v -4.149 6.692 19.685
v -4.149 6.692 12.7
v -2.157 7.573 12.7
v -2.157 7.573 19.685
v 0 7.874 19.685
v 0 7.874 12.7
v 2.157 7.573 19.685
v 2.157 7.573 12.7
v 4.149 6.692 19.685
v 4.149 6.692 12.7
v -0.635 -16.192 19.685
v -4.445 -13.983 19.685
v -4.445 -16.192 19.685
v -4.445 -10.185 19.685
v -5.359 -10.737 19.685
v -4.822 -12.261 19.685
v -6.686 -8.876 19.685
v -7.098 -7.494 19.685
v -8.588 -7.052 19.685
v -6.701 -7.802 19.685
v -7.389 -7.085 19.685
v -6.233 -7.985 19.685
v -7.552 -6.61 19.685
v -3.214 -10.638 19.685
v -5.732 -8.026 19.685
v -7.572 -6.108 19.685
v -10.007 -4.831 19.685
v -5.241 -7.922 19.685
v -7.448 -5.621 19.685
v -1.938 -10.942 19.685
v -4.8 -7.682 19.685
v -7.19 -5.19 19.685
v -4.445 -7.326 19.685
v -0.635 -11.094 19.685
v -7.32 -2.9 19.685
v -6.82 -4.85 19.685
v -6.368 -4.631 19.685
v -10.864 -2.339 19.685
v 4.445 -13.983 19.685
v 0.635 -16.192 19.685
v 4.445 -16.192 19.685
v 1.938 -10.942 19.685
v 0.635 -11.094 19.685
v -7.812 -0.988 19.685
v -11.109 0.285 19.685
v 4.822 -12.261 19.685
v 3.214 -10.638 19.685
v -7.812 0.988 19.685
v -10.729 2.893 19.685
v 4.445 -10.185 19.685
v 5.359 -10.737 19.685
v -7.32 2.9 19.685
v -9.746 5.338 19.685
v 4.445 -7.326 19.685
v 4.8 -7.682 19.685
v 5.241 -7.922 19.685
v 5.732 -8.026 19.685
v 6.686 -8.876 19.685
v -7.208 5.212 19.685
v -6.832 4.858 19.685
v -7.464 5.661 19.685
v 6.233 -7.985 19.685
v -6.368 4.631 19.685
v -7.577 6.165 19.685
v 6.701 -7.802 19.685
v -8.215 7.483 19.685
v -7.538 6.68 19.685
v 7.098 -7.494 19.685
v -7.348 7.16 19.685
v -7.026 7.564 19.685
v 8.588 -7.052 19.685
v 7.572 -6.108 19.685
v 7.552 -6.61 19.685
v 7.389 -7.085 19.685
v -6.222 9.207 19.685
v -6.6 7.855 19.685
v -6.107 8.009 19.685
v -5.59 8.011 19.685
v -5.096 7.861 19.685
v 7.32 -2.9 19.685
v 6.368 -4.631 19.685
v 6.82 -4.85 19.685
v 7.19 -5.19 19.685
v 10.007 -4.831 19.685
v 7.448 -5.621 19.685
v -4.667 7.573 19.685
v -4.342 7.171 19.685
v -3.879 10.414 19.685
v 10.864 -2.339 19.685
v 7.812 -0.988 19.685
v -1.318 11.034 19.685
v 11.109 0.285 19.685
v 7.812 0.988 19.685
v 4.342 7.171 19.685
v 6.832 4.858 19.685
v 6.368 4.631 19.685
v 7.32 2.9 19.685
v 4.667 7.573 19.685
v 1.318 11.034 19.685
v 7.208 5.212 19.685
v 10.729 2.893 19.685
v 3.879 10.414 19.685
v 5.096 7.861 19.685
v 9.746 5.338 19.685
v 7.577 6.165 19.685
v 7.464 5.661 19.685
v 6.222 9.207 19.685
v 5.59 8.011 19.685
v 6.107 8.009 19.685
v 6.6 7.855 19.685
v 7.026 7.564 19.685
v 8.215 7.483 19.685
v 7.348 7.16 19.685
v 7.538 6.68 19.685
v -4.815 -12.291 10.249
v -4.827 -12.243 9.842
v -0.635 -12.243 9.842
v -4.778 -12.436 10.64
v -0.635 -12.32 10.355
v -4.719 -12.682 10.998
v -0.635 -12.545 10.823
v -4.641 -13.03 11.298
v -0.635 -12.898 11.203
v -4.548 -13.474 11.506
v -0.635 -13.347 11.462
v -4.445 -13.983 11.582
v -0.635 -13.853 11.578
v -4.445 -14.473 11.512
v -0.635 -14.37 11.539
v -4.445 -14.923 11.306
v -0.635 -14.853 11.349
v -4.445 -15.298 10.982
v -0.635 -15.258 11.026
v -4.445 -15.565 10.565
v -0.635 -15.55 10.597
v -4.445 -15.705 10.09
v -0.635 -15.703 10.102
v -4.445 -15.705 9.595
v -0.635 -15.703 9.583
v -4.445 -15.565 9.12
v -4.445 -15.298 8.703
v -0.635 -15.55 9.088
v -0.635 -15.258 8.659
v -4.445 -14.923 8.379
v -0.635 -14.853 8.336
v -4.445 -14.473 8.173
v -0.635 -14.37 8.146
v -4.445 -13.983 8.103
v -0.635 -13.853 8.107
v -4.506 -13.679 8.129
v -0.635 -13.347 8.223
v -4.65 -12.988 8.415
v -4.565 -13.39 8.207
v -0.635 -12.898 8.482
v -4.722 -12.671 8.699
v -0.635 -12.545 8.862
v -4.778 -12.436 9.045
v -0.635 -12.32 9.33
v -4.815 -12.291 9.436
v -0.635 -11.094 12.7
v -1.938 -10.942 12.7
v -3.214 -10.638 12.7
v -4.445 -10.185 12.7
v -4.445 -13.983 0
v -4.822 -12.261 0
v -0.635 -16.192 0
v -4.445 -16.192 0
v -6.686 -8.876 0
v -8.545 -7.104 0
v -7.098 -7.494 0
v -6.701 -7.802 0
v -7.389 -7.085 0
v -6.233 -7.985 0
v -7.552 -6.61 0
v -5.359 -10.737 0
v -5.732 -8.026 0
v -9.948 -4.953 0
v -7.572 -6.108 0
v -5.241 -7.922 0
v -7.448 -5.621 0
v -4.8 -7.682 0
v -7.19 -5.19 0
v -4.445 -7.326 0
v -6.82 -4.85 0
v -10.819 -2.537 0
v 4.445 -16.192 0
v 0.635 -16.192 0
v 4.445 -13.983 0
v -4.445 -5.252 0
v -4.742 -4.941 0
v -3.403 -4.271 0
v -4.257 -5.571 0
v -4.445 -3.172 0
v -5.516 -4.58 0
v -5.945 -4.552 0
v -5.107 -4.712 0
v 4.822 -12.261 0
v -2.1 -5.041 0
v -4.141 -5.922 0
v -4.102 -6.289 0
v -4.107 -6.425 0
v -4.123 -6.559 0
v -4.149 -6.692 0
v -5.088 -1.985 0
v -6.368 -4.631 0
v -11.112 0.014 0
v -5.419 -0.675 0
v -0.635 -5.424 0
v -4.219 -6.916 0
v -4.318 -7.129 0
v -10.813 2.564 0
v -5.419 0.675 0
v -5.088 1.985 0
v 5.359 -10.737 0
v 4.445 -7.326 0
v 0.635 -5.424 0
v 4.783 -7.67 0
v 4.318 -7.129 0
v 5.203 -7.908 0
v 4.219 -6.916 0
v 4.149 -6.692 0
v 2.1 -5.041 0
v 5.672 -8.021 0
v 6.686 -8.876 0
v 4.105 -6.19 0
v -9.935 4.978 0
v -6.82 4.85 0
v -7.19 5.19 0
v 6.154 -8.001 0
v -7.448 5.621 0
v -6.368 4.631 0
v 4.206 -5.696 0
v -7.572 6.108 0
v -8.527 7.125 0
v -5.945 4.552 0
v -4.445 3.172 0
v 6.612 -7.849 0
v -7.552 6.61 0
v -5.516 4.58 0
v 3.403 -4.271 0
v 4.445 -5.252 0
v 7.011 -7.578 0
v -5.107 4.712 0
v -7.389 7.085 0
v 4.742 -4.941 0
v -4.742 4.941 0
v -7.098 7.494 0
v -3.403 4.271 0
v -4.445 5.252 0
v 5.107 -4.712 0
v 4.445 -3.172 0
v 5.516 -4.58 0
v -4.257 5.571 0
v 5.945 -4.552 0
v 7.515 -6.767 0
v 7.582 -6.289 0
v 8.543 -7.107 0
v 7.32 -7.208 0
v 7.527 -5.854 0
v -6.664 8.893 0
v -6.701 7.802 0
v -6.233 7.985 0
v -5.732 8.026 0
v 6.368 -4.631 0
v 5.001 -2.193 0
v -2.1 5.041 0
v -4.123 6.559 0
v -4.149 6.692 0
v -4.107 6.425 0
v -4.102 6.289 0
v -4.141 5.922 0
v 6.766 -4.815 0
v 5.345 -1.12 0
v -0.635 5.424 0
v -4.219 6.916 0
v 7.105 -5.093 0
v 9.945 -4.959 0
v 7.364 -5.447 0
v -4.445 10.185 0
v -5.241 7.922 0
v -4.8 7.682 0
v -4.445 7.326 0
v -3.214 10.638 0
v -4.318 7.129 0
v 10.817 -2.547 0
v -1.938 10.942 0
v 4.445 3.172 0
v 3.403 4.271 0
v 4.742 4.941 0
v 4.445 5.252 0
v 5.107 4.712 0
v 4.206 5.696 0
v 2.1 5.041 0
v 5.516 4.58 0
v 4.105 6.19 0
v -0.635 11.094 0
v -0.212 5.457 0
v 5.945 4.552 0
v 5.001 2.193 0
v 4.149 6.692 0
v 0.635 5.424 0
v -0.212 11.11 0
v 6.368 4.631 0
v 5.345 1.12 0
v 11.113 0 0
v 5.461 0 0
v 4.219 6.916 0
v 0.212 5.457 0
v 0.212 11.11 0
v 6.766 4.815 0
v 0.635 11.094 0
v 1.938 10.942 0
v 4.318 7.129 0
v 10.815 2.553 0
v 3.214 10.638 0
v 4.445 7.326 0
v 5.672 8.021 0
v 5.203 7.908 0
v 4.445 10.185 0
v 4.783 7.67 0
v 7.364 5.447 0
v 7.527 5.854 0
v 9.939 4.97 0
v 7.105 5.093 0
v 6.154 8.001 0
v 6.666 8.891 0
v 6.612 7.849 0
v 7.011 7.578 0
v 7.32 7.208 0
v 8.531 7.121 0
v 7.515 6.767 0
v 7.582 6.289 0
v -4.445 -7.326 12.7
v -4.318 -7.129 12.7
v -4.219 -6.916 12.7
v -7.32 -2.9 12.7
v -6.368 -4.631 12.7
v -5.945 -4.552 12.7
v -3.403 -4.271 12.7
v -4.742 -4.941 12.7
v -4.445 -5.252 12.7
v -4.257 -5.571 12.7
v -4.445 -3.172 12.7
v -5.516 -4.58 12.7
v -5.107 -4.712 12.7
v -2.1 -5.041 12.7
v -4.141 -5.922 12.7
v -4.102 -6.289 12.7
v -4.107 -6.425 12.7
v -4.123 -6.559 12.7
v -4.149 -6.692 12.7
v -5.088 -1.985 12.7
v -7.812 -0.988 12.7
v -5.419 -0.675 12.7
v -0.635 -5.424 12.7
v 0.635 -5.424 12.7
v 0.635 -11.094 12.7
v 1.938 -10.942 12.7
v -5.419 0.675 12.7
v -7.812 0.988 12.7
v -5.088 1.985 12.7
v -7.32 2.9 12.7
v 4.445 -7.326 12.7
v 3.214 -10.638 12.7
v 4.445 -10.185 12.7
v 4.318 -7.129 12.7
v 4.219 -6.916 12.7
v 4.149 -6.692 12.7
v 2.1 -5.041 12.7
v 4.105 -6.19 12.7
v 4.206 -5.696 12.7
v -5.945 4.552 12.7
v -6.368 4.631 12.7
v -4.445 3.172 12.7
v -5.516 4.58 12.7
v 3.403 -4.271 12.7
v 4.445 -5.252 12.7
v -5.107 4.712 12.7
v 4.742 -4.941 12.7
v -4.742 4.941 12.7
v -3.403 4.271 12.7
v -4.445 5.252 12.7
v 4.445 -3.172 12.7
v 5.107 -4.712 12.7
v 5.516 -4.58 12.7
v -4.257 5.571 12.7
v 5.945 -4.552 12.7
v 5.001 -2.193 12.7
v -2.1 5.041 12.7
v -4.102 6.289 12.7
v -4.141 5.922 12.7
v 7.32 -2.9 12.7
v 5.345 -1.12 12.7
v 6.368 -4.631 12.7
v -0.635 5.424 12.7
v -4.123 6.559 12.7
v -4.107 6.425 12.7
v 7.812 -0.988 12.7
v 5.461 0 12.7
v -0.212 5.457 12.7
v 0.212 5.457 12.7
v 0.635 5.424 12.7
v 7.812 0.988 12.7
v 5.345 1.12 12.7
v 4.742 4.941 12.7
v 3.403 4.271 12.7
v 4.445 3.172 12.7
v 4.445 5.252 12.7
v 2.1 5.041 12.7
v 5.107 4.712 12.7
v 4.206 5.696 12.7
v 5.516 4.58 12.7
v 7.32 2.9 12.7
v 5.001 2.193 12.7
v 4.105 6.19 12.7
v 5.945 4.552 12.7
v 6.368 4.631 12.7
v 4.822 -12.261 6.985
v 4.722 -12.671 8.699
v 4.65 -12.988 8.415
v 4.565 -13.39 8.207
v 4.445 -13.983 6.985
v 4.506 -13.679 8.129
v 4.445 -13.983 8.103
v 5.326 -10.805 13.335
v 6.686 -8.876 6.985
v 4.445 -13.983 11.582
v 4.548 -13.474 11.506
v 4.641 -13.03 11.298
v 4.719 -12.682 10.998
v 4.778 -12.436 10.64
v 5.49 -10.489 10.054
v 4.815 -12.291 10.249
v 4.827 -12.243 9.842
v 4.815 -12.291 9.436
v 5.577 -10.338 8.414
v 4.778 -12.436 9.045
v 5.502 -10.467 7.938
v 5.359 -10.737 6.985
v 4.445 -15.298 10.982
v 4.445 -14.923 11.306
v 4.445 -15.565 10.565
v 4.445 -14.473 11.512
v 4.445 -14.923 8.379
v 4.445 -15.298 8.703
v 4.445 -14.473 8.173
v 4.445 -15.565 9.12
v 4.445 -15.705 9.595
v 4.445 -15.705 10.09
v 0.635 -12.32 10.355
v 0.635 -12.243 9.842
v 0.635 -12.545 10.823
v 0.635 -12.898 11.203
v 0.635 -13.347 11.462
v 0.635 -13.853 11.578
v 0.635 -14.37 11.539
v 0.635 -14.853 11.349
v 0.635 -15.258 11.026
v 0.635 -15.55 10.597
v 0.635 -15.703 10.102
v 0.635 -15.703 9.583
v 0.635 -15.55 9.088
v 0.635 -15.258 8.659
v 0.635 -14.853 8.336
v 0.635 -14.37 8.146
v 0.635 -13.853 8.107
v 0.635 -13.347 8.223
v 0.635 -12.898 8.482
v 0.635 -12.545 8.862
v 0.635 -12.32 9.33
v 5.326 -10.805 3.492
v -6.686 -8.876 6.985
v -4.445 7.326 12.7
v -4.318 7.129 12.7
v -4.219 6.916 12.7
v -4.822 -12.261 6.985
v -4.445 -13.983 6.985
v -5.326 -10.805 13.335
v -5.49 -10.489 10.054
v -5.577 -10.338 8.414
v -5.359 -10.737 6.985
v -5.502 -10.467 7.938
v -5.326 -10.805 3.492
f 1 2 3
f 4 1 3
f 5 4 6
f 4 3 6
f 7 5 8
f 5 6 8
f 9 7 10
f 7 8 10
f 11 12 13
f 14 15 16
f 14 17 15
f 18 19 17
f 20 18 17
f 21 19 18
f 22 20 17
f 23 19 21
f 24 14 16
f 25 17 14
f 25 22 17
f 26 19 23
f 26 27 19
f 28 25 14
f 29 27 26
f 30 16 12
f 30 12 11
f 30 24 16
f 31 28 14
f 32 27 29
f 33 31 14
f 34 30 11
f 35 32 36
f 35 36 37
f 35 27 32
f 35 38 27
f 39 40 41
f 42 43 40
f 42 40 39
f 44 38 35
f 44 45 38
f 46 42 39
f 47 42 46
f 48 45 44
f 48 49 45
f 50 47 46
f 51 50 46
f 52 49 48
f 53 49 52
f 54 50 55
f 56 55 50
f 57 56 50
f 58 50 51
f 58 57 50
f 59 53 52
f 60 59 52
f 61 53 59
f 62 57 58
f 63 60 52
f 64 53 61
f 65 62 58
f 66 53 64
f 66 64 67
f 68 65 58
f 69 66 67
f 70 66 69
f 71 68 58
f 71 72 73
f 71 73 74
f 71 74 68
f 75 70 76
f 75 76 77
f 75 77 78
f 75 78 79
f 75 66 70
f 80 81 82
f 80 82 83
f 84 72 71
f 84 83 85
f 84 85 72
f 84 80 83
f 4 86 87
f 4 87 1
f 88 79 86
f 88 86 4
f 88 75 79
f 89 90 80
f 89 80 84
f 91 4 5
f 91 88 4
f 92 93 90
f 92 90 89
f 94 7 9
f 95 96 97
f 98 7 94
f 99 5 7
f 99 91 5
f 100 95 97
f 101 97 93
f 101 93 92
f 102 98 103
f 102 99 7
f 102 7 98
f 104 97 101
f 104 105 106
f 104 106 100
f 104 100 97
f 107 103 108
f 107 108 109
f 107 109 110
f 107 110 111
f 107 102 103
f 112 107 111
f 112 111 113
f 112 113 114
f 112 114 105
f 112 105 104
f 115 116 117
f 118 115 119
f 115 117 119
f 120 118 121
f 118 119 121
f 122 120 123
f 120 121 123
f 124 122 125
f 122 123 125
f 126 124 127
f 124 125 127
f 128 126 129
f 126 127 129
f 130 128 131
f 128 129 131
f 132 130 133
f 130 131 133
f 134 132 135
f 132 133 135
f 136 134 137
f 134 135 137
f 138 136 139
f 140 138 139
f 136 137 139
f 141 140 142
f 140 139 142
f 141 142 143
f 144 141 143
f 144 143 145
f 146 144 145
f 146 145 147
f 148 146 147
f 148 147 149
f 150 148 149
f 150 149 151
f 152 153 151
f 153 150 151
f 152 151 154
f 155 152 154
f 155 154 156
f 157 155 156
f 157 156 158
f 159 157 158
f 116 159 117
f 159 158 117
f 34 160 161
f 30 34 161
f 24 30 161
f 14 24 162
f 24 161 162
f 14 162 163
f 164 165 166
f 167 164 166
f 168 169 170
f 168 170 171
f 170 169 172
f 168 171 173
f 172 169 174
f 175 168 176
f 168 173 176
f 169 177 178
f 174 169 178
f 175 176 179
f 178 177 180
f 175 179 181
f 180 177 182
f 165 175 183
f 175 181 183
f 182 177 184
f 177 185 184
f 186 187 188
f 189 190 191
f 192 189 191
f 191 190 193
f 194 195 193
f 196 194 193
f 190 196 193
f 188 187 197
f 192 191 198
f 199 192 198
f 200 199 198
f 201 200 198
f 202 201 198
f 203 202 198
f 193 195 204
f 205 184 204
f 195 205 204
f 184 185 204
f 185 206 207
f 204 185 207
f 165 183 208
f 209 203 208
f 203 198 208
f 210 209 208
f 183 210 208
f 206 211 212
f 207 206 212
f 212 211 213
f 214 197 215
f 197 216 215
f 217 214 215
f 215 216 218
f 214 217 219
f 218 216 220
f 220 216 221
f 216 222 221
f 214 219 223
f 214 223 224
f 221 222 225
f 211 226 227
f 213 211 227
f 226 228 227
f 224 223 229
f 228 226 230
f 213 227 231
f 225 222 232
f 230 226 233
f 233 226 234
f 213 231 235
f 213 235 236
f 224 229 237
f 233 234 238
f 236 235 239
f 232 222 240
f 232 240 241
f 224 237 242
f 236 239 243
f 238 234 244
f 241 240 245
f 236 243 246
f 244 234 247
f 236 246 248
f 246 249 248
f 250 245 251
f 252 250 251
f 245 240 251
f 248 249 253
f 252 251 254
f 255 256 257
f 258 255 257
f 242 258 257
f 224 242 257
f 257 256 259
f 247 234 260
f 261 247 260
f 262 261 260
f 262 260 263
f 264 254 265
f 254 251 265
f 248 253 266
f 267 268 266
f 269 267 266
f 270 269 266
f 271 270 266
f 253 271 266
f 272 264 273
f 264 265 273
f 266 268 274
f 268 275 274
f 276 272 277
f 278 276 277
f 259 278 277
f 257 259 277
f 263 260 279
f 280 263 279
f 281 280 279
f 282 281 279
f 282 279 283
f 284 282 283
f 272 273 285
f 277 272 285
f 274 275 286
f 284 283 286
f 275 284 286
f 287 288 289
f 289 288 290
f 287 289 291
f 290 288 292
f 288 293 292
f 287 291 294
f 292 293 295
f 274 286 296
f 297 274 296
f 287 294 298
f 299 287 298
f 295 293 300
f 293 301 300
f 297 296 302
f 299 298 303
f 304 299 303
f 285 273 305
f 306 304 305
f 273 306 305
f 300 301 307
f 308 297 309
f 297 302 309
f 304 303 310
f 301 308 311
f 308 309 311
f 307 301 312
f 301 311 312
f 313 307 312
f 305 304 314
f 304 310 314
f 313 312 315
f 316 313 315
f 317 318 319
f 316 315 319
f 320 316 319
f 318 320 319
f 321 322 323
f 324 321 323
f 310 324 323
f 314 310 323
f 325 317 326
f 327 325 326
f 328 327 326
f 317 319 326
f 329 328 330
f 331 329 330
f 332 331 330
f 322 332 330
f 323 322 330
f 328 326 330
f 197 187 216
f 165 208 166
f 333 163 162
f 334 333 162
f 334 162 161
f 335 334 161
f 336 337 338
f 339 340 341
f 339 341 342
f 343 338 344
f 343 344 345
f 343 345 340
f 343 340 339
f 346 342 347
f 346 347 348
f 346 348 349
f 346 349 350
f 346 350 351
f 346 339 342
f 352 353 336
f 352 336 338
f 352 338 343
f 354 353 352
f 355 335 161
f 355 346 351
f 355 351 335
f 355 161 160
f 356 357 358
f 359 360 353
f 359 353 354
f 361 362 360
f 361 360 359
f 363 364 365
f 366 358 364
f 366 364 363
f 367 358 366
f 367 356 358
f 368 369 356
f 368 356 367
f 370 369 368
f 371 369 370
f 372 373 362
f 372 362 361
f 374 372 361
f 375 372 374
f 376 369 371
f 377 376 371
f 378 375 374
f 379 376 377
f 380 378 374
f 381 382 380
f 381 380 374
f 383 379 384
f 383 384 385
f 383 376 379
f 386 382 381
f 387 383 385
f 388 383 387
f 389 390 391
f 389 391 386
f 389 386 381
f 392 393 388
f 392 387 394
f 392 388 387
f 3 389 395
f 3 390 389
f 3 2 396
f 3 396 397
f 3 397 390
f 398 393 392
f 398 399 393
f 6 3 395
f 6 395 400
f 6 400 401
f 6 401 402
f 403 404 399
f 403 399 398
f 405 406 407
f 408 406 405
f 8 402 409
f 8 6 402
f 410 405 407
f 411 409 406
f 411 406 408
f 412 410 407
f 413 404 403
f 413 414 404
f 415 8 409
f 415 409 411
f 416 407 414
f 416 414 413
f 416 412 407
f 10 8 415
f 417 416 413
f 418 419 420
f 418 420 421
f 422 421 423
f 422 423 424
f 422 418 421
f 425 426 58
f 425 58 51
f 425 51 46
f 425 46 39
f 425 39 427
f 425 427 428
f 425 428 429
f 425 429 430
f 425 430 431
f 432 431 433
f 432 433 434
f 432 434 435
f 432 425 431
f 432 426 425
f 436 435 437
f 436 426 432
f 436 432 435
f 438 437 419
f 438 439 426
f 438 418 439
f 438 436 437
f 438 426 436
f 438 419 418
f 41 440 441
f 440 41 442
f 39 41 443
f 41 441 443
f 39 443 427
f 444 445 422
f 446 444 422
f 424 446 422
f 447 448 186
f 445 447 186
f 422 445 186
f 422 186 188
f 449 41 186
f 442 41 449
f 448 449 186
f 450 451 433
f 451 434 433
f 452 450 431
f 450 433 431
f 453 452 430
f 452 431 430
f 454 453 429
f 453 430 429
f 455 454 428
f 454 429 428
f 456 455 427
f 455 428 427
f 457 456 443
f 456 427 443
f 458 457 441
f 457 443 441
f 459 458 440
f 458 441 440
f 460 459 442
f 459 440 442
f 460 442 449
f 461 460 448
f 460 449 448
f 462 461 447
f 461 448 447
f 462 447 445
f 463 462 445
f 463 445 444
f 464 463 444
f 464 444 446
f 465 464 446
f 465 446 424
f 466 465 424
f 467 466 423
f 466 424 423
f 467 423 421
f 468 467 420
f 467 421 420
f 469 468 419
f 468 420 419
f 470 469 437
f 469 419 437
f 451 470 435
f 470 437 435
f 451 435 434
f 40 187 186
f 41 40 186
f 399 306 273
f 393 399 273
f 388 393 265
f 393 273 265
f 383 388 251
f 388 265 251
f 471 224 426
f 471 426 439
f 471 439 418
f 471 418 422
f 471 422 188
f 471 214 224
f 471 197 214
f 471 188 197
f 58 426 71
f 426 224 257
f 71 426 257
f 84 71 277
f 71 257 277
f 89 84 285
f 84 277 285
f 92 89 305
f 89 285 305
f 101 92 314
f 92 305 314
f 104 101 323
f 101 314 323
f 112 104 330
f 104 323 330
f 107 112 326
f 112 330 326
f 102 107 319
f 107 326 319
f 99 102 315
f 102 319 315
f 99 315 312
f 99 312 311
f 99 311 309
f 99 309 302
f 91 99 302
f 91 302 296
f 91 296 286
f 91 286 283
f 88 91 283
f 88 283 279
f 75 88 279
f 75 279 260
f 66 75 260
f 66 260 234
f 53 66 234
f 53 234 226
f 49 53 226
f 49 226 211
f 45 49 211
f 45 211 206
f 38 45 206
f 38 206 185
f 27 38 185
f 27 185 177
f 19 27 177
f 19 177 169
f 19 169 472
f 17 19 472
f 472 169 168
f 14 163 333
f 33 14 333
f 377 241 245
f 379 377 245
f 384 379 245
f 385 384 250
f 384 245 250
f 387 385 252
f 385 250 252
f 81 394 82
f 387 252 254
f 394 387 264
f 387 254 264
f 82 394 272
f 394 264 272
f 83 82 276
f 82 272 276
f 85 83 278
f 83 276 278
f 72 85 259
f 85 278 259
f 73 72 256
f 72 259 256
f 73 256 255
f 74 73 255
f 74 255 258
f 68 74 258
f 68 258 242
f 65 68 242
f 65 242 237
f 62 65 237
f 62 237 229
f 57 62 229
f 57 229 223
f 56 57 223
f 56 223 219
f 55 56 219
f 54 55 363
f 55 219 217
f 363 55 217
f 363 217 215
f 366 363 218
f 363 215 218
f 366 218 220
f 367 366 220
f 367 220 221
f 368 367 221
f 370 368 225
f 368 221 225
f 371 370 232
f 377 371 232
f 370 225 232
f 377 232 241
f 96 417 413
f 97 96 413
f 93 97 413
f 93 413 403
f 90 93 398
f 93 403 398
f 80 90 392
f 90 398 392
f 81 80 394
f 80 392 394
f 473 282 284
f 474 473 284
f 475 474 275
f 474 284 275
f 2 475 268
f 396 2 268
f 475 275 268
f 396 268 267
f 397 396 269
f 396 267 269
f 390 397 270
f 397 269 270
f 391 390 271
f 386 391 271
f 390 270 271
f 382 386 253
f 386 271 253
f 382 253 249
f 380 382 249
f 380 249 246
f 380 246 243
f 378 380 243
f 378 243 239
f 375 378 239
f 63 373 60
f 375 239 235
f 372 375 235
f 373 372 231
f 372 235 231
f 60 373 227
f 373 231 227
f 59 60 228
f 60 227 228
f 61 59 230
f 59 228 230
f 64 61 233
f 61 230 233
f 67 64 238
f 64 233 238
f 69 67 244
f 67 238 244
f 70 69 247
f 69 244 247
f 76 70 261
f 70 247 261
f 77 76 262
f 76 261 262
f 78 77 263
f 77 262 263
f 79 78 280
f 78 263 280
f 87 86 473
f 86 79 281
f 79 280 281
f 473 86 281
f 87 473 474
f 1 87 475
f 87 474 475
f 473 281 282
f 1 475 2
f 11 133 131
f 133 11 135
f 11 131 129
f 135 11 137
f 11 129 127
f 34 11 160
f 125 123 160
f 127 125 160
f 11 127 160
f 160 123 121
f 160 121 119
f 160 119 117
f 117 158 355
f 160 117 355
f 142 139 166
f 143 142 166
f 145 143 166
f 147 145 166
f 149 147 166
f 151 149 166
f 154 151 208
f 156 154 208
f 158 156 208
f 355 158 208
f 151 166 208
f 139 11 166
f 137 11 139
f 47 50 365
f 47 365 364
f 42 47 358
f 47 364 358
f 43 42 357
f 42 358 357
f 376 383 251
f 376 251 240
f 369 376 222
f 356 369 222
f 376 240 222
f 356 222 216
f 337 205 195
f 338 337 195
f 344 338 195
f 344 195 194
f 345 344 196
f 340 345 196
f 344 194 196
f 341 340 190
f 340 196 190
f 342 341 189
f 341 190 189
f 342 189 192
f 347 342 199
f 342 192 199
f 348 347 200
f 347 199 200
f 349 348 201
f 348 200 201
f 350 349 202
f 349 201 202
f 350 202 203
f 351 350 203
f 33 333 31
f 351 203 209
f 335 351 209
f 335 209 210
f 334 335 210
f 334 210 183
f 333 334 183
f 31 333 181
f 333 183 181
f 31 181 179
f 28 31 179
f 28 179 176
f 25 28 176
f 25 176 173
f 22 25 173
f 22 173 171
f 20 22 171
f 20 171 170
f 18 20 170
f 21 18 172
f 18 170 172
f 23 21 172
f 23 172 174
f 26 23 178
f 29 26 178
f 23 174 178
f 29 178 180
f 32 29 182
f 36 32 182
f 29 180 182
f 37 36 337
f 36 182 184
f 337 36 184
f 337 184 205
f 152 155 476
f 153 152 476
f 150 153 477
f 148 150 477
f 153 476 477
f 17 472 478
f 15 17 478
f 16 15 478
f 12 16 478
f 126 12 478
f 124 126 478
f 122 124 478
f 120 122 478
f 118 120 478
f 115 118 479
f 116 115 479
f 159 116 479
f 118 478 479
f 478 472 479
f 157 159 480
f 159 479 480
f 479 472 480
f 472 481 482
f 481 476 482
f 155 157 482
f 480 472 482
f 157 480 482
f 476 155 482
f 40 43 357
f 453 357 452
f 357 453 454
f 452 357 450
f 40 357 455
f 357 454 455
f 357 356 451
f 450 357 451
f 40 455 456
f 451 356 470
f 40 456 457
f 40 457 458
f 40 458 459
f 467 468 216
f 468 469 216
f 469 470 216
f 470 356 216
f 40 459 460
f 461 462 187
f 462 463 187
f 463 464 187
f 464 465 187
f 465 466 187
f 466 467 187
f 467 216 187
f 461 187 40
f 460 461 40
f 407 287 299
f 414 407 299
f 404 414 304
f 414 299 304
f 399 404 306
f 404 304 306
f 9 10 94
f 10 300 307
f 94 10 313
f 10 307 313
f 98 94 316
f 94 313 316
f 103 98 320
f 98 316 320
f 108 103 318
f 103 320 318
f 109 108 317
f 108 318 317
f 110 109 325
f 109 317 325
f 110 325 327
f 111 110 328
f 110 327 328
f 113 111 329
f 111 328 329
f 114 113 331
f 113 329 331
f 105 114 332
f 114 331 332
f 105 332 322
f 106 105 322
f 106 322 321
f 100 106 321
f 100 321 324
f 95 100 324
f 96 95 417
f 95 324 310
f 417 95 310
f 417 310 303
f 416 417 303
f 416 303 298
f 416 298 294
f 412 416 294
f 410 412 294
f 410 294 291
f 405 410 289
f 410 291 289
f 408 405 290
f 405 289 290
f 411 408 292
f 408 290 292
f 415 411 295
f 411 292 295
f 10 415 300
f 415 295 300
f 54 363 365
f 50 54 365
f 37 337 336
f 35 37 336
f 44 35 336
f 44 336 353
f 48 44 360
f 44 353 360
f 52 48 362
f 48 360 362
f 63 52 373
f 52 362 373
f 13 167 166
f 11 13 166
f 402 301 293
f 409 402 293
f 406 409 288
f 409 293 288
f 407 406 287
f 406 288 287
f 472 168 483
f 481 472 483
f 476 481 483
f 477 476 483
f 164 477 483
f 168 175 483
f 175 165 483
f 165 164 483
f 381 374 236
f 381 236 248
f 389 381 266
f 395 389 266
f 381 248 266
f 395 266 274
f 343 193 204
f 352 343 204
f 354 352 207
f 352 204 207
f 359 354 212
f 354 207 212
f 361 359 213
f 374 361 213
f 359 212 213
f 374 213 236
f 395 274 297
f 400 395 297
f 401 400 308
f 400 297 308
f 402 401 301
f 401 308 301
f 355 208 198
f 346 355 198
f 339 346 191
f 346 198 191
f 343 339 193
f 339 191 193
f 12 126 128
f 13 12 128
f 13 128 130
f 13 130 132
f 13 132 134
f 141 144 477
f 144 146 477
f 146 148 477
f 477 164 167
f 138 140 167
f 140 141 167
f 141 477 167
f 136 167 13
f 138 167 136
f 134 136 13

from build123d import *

# Parameters (mm, degrees)
F1_DEPTH      = 6.985
F2_DEPTH      = 12.7
F3_R          = 1.7399
F4_DEPTH      = 25.4
F4_DEPTH_BACK = 25.4


with BuildPart() as f1:
    # F0 (on Top) → F1 (new body)
    with BuildSketch(Plane.XY):
        with BuildLine():
            ThreePointArc((-6.6861946277, -8.8759482677), (-5.6039387911, -9.5960161669), (-4.445, -10.184774482))
            Line((-4.445, -10.184774482), (-4.445, -7.326322721))
            ThreePointArc((-4.445, -7.326322721), (-7.2583236845, -7.2997742217), (-6.3683207306, -4.6308063091))
            ThreePointArc((-6.3683207306, -4.6308063091), (-7.874, 0), (-6.3683207306, 4.6308063091))
            ThreePointArc((-6.3683207306, 4.6308063091), (-7.2583236845, 7.2997742217), (-4.445, 7.326322721))
            Line((-4.445, 7.326322721), (-4.445, 10.184774482))
            ThreePointArc((-4.445, 10.184774482), (-11.0364696074, 1.2976882733), (-6.6861946277, -8.8759482677))
        make_face()
        with BuildLine():
            Line((-0.635, 7.8483533942), (-0.635, 11.0943423081))
            ThreePointArc((-0.635, 11.0943423081), (-2.5803930723, 10.808756998), (-4.445, 10.184774482))
            Line((-4.445, 10.184774482), (-4.445, 7.326322721))
            ThreePointArc((-4.445, 7.326322721), (-4.264959614, 7.0241706334), (-4.149365906, 6.6919831573))
            ThreePointArc((-4.149365906, 6.6919831573), (-2.4610642641, 7.4795079175), (-0.635, 7.8483533942))
        make_face()
        with BuildLine():
            Line((4.445, 7.326322721), (4.445, 10.184774482))
            ThreePointArc((4.445, 10.184774482), (2.5803930723, 10.808756998), (0.635, 11.0943423081))
            Line((0.635, 11.0943423081), (0.635, 7.8483533942))
            ThreePointArc((0.635, 7.8483533942), (2.4610642641, 7.4795079175), (4.149365906, 6.6919831573))
            ThreePointArc((4.149365906, 6.6919831573), (4.264959614, 7.0241706334), (4.445, 7.326322721))
        make_face()
        with BuildLine():
            ThreePointArc((4.445, -10.184774482), (5.6039387911, -9.5960161669), (6.6861946277, -8.8759482677))
            ThreePointArc((6.6861946277, -8.8759482677), (9.9445460945, -4.959199454), (11.1125, 0))
            ThreePointArc((11.1125, 0), (9.2973845449, 6.0865669203), (4.445, 10.184774482))
            Line((4.445, 10.184774482), (4.445, 7.326322721))
            ThreePointArc((4.445, 7.326322721), (6.3881738322, 7.9411428381), (7.5819, 6.2891906127))
            ThreePointArc((7.5819, 6.2891906127), (7.2461006818, 5.2616920554), (6.3683207306, 4.6308063091))
            ThreePointArc((6.3683207306, 4.6308063091), (7.4881250468, 2.4347195493), (7.874, 0))
            ThreePointArc((7.874, 0), (7.4881250468, -2.4347195493), (6.3683207306, -4.6308063091))
            ThreePointArc((6.3683207306, -4.6308063091), (7.2461006818, -5.2616920554), (7.5819, -6.2891906127))
            ThreePointArc((7.5819, -6.2891906127), (6.3881738322, -7.9411428381), (4.445, -7.326322721))
            Line((4.445, -7.326322721), (4.445, -10.184774482))
        make_face()
        with BuildLine():
            Line((0.635, 7.8483533942), (0.635, 11.0943423081))
            ThreePointArc((0.635, 11.0943423081), (0, 11.1125), (-0.635, 11.0943423081))
            Line((-0.635, 11.0943423081), (-0.635, 7.8483533942))
            ThreePointArc((-0.635, 7.8483533942), (0, 7.874), (0.635, 7.8483533942))
        make_face()
        with BuildLine():
            Line((-4.445, -13.9827691019), (-4.445, -10.184774482))
            ThreePointArc((-4.445, -10.184774482), (-5.6039387911, -9.5960161669), (-6.6861946277, -8.8759482677))
            add(Edge.make_bspline(
                [(-6.6861946277, -8.8759482677), (-6.1885628089, -9.4638964345), (-5.0921901135, -10.7354953403), (-4.6739221939, -12.8428610165), (-4.445, -13.9827691019)],
                knots=[0, 0, 0, 0, 0.4582938074, 1, 1, 1, 1], degree=3))
        make_face()
        with BuildLine():
            Line((-0.635, -16.1925), (-0.635, -11.0943423081))
            ThreePointArc((-0.635, -11.0943423081), (-2.5803930723, -10.808756998), (-4.445, -10.184774482))
            Line((-4.445, -10.184774482), (-4.445, -13.9827691019))
            Line((-4.445, -13.9827691019), (-4.445, -16.1925))
            Line((-4.445, -16.1925), (-0.635, -16.1925))
        make_face()
        with BuildLine():
            Line((4.445, -13.9827691019), (4.445, -10.184774482))
            ThreePointArc((4.445, -10.184774482), (2.5803930723, -10.808756998), (0.635, -11.0943423081))
            Line((0.635, -11.0943423081), (0.635, -16.1925))
            Line((0.635, -16.1925), (4.445, -16.1925))
            Line((4.445, -16.1925), (4.445, -13.9827691019))
        make_face()
        with BuildLine():
            add(Edge.make_bspline(
                [(6.6861946277, -8.8759482677), (6.1885628089, -9.4638964345), (5.0921901135, -10.7354953403), (4.6739221939, -12.8428610165), (4.445, -13.9827691019)],
                knots=[0, 0, 0, 0, 0.4582938074, 1, 1, 1, 1], degree=3))
            ThreePointArc((6.6861946277, -8.8759482677), (5.6039387911, -9.5960161669), (4.445, -10.184774482))
            Line((4.445, -10.184774482), (4.445, -13.9827691019))
        make_face()
    extrude(amount=F1_DEPTH)

    # F0 (on Top) + F1_face (on face) → F2 (join)
    with BuildSketch(Plane.XY):
        with BuildLine():
            ThreePointArc((-6.3683207306, 4.6308063091), (-7.874, 0), (-6.3683207306, -4.6308063091))
            ThreePointArc((-6.3683207306, -4.6308063091), (-5.3072017482, -4.6335207061), (-4.445, -5.2520585045))
            Line((-4.445, -5.2520585045), (-4.445, -3.1724589832))
            ThreePointArc((-4.445, -3.1724589832), (-5.461, 0), (-4.445, 3.1724589832))
            Line((-4.445, 3.1724589832), (-4.445, 5.2520585045))
            ThreePointArc((-4.445, 5.2520585045), (-5.3072017482, 4.6335207061), (-6.3683207306, 4.6308063091))
        make_face()
        with BuildLine():
            Line((-0.635, 5.423955752), (-0.635, 7.8483533942))
            ThreePointArc((-0.635, 7.8483533942), (-2.4610642641, 7.4795079175), (-4.149365906, 6.6919831573))
            ThreePointArc((-4.149365906, 6.6919831573), (-4.113956877, 6.491968755), (-4.1021, 6.2891906127))
            ThreePointArc((-4.1021, 6.2891906127), (-4.1900477746, 5.7430167805), (-4.445, 5.2520585045))
            Line((-4.445, 5.2520585045), (-4.445, 3.1724589832))
            ThreePointArc((-4.445, 3.1724589832), (-2.7782925377, 4.7014478169), (-0.635, 5.423955752))
        make_face()
        with BuildLine():
            ThreePointArc((4.149365906, 6.6919831573), (2.4610642641, 7.4795079175), (0.635, 7.8483533942))
            Line((0.635, 7.8483533942), (0.635, 5.423955752))
            ThreePointArc((0.635, 5.423955752), (2.7782925377, 4.7014478169), (4.445, 3.1724589832))
            Line((4.445, 3.1724589832), (4.445, 5.2520585045))
            ThreePointArc((4.445, 5.2520585045), (4.1376510158, 5.9392669784), (4.149365906, 6.6919831573))
        make_face()
        with BuildLine():
            Line((4.445, -3.1724589832), (4.445, -5.2520585045))
            ThreePointArc((4.445, -5.2520585045), (5.3072017482, -4.6335207061), (6.3683207306, -4.6308063091))
            ThreePointArc((6.3683207306, -4.6308063091), (7.4881250468, -2.4347195493), (7.874, 0))
            ThreePointArc((7.874, 0), (7.4881250468, 2.4347195493), (6.3683207306, 4.6308063091))
            ThreePointArc((6.3683207306, 4.6308063091), (5.3072017482, 4.6335207061), (4.445, 5.2520585045))
            Line((4.445, 5.2520585045), (4.445, 3.1724589832))
            ThreePointArc((4.445, 3.1724589832), (5.2008011883, 1.6655893852), (5.461, 0))
            ThreePointArc((5.461, 0), (5.2008011883, -1.6655893852), (4.445, -3.1724589832))
        make_face()
        with BuildLine():
            Line((0.635, -5.423955752), (0.635, -7.8483533942))
            ThreePointArc((0.635, -7.8483533942), (2.4610642641, -7.4795079175), (4.149365906, -6.6919831573))
            ThreePointArc((4.149365906, -6.6919831573), (4.1376510158, -5.9392669784), (4.445, -5.2520585045))
            Line((4.445, -5.2520585045), (4.445, -3.1724589832))
            ThreePointArc((4.445, -3.1724589832), (2.7782925377, -4.7014478169), (0.635, -5.423955752))
        make_face()
        with BuildLine():
            ThreePointArc((-4.149365906, -6.6919831573), (-2.4610642641, -7.4795079175), (-0.635, -7.8483533942))
            Line((-0.635, -7.8483533942), (-0.635, -5.423955752))
            ThreePointArc((-0.635, -5.423955752), (-2.7782925377, -4.7014478169), (-4.445, -3.1724589832))
            Line((-4.445, -3.1724589832), (-4.445, -5.2520585045))
            ThreePointArc((-4.445, -5.2520585045), (-4.1900477746, -5.7430167805), (-4.1021, -6.2891906127))
            ThreePointArc((-4.1021, -6.2891906127), (-4.113956877, -6.491968755), (-4.149365906, -6.6919831573))
        make_face()
        with BuildLine():
            ThreePointArc((-4.445, -10.184774482), (-2.5803930723, -10.808756998), (-0.635, -11.0943423081))
            Line((-0.635, -11.0943423081), (-0.635, -7.8483533942))
            ThreePointArc((-0.635, -7.8483533942), (-2.4610642641, -7.4795079175), (-4.149365906, -6.6919831573))
            ThreePointArc((-4.149365906, -6.6919831573), (-4.264959614, -7.0241706334), (-4.445, -7.326322721))
            Line((-4.445, -7.326322721), (-4.445, -10.184774482))
        make_face()
        with BuildLine():
            ThreePointArc((0.635, -11.0943423081), (2.5803930723, -10.808756998), (4.445, -10.184774482))
            Line((4.445, -10.184774482), (4.445, -7.326322721))
            ThreePointArc((4.445, -7.326322721), (4.264959614, -7.0241706334), (4.149365906, -6.6919831573))
            ThreePointArc((4.149365906, -6.6919831573), (2.4610642641, -7.4795079175), (0.635, -7.8483533942))
            Line((0.635, -7.8483533942), (0.635, -11.0943423081))
        make_face()
        with BuildLine():
            ThreePointArc((4.445, -10.184774482), (5.6039387911, -9.5960161669), (6.6861946277, -8.8759482677))
            ThreePointArc((6.6861946277, -8.8759482677), (9.9445460945, -4.959199454), (11.1125, 0))
            ThreePointArc((11.1125, 0), (9.2973845449, 6.0865669203), (4.445, 10.184774482))
            Line((4.445, 10.184774482), (4.445, 7.326322721))
            ThreePointArc((4.445, 7.326322721), (6.3881738322, 7.9411428381), (7.5819, 6.2891906127))
            ThreePointArc((7.5819, 6.2891906127), (7.2461006818, 5.2616920554), (6.3683207306, 4.6308063091))
            ThreePointArc((6.3683207306, 4.6308063091), (7.4881250468, 2.4347195493), (7.874, 0))
            ThreePointArc((7.874, 0), (7.4881250468, -2.4347195493), (6.3683207306, -4.6308063091))
            ThreePointArc((6.3683207306, -4.6308063091), (7.2461006818, -5.2616920554), (7.5819, -6.2891906127))
            ThreePointArc((7.5819, -6.2891906127), (6.3881738322, -7.9411428381), (4.445, -7.326322721))
            Line((4.445, -7.326322721), (4.445, -10.184774482))
        make_face()
        with BuildLine():
            Line((4.445, 7.326322721), (4.445, 10.184774482))
            ThreePointArc((4.445, 10.184774482), (2.5803930723, 10.808756998), (0.635, 11.0943423081))
            Line((0.635, 11.0943423081), (0.635, 7.8483533942))
            ThreePointArc((0.635, 7.8483533942), (2.4610642641, 7.4795079175), (4.149365906, 6.6919831573))
            ThreePointArc((4.149365906, 6.6919831573), (4.264959614, 7.0241706334), (4.445, 7.326322721))
        make_face()
        with BuildLine():
            Line((-0.635, 7.8483533942), (-0.635, 11.0943423081))
            ThreePointArc((-0.635, 11.0943423081), (-2.5803930723, 10.808756998), (-4.445, 10.184774482))
            Line((-4.445, 10.184774482), (-4.445, 7.326322721))
            ThreePointArc((-4.445, 7.326322721), (-4.264959614, 7.0241706334), (-4.149365906, 6.6919831573))
            ThreePointArc((-4.149365906, 6.6919831573), (-2.4610642641, 7.4795079175), (-0.635, 7.8483533942))
        make_face()
        with BuildLine():
            ThreePointArc((-6.6861946277, -8.8759482677), (-5.6039387911, -9.5960161669), (-4.445, -10.184774482))
            Line((-4.445, -10.184774482), (-4.445, -7.326322721))
            ThreePointArc((-4.445, -7.326322721), (-7.2583236845, -7.2997742217), (-6.3683207306, -4.6308063091))
            ThreePointArc((-6.3683207306, -4.6308063091), (-7.874, 0), (-6.3683207306, 4.6308063091))
            ThreePointArc((-6.3683207306, 4.6308063091), (-7.2583236845, 7.2997742217), (-4.445, 7.326322721))
            Line((-4.445, 7.326322721), (-4.445, 10.184774482))
            ThreePointArc((-4.445, 10.184774482), (-11.0364696074, 1.2976882733), (-6.6861946277, -8.8759482677))
        make_face()
        with BuildLine():
            Line((0.635, 7.8483533942), (0.635, 11.0943423081))
            ThreePointArc((0.635, 11.0943423081), (0, 11.1125), (-0.635, 11.0943423081))
            Line((-0.635, 11.0943423081), (-0.635, 7.8483533942))
            ThreePointArc((-0.635, 7.8483533942), (0, 7.874), (0.635, 7.8483533942))
        make_face()
        with BuildLine():
            Line((0.635, 5.423955752), (0.635, 7.8483533942))
            ThreePointArc((0.635, 7.8483533942), (0, 7.874), (-0.635, 7.8483533942))
            Line((-0.635, 7.8483533942), (-0.635, 5.423955752))
            ThreePointArc((-0.635, 5.423955752), (0, 5.461), (0.635, 5.423955752))
        make_face()
    with BuildSketch(Plane(origin=(0, -1.8857820948, 6.985), x_dir=(1, 0, 0), z_dir=(0, 0, 1))):
        with BuildLine():
            ThreePointArc((-4.445, -5.4405406262), (-7.2583236845, -5.4139921269), (-6.3683207306, -2.7450242143))
            ThreePointArc((-6.3683207306, -2.7450242143), (-7.874, 1.8857820948), (-6.3683207306, 6.5165884039))
            ThreePointArc((-6.3683207306, 6.5165884039), (-7.0261385963, 9.4497541769), (-4.149365906, 8.5777652521))
            ThreePointArc((-4.149365906, 8.5777652521), (0, 9.7597820948), (4.149365906, 8.5777652521))
            ThreePointArc((4.149365906, 8.5777652521), (7.0261385963, 9.4497541769), (6.3683207306, 6.5165884039))
            ThreePointArc((6.3683207306, 6.5165884039), (7.874, 1.8857820948), (6.3683207306, -2.7450242143))
            ThreePointArc((6.3683207306, -2.7450242143), (7.2583236845, -5.4139921269), (4.445, -5.4405406262))
            Line((4.445, -5.4405406262), (4.445, -8.2989923872))
            ThreePointArc((4.445, -8.2989923872), (2.5803930723, -8.9229749032), (0.635, -9.2085602133))
            Line((0.635, -9.2085602133), (0.635, -14.3067179052))
            Line((0.635, -14.3067179052), (4.445, -14.3067179052))
            Line((4.445, -14.3067179052), (4.445, -12.0969870071))
            add(Edge.make_bspline(
                [(6.6861946277, -6.9901661729), (6.1885628089, -7.5781143397), (5.0921901135, -8.8497132455), (4.6739221939, -10.9570789217), (4.445, -12.0969870071)],
                knots=[0, 0, 0, 0, 0.4582938074, 1, 1, 1, 1], degree=3))
            ThreePointArc((6.6861946277, -6.9901661729), (0, 12.9982820948), (-6.6861946277, -6.9901661729))
            add(Edge.make_bspline(
                [(-6.6861946277, -6.9901661729), (-6.1885628089, -7.5781143397), (-5.0921901135, -8.8497132455), (-4.6739221939, -10.9570789217), (-4.445, -12.0969870071)],
                knots=[0, 0, 0, 0, 0.4582938074, 1, 1, 1, 1], degree=3))
            Line((-4.445, -12.0969870071), (-4.445, -14.3067179052))
            Line((-4.445, -14.3067179052), (-0.635, -14.3067179052))
            Line((-0.635, -14.3067179052), (-0.635, -9.2085602133))
            ThreePointArc((-0.635, -9.2085602133), (-2.5803930723, -8.9229749032), (-4.445, -8.2989923872))
            Line((-4.445, -8.2989923872), (-4.445, -5.4405406262))
        make_face()
    extrude(amount=F2_DEPTH)

    # F3 (on face) → F4 (cut, two sides)
    with BuildSketch(Plane.YZ.offset(4.445)) as f4_sk:
        with Locations((-13.9827691019, 9.8425)):
            Circle(F3_R)
    extrude(amount=-F4_DEPTH, mode=Mode.SUBTRACT)
    extrude(f4_sk.sketch, amount=F4_DEPTH_BACK, mode=Mode.SUBTRACT)


solid = f1.part
